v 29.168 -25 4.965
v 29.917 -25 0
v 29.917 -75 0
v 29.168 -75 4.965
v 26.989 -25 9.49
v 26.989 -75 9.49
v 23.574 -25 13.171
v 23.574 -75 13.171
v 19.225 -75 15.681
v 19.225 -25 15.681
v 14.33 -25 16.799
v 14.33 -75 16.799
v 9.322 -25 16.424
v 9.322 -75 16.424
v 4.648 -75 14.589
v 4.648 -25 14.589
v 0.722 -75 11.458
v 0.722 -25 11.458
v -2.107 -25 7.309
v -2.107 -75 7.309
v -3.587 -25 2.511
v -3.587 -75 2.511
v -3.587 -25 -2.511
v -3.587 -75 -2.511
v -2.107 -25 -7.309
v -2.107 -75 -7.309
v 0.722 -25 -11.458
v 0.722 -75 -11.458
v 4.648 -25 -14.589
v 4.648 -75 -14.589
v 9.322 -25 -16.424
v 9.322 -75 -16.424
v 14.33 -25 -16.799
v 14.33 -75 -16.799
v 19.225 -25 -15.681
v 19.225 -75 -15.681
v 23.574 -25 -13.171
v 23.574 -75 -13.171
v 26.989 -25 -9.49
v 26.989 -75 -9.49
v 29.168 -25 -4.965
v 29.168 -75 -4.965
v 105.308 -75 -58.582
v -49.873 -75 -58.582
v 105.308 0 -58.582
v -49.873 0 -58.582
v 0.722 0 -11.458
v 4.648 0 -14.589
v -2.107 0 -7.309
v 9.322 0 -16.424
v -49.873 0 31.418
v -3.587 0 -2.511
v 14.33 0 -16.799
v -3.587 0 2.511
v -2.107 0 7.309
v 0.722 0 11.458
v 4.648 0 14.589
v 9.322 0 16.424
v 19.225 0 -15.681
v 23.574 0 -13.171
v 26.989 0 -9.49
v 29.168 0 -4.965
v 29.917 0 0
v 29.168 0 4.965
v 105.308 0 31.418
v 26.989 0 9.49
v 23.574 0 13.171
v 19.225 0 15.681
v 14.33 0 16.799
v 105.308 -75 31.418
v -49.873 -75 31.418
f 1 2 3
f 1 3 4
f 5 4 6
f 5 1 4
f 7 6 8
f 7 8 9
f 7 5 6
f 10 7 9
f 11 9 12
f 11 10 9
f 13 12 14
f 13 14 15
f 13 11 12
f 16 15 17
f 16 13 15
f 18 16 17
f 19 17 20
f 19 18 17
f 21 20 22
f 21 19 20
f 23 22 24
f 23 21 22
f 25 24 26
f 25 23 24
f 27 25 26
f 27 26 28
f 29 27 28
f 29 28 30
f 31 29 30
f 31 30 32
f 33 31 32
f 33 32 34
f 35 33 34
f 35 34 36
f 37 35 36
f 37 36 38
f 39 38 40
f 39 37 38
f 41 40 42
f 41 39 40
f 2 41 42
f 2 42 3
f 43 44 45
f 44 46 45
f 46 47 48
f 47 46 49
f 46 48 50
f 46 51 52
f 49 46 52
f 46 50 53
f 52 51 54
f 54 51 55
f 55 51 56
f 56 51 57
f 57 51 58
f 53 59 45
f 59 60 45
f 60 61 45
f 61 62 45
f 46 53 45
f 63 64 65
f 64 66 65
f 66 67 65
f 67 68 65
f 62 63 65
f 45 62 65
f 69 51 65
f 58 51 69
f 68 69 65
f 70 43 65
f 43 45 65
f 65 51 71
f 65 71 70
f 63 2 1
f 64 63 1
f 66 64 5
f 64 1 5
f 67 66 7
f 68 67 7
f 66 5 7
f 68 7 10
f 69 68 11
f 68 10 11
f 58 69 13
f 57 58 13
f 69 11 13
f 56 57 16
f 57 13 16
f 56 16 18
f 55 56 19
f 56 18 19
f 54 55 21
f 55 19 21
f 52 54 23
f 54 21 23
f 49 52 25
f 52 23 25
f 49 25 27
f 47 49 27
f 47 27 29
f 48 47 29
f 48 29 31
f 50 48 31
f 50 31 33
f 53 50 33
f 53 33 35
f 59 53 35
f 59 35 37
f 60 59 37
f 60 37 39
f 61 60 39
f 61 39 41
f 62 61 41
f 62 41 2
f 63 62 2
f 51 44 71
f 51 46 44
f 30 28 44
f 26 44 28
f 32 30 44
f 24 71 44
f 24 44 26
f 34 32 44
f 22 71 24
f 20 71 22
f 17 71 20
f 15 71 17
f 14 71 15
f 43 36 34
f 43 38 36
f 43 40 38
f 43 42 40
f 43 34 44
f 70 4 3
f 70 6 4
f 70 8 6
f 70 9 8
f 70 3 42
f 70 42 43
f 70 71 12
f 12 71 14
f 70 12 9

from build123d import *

# Parameters (mm, degrees)
F0_W      = 155.180738
F0_H      = 90
F1_DEPTH  = 25
F2_R      = 16.845897
F3_DEPTH  = 25.001
F1_FACE_W = 155.180738
F1_FACE_H = 90
F1_FACE_R = 16.845897
F4_DEPTH  = 50


with BuildPart() as f1:
    # F0 (on Front) → F1 (new body)
    with BuildSketch(Plane.XZ):
        with Locations((27.717258, -13.581821)):
            Rectangle(F0_W, F0_H)
    extrude(amount=F1_DEPTH)

    # F2 (on face) → F3 (cut, through all)
    with BuildSketch(Plane.XZ.offset(25)):
        with Locations((13.070613, 0)):
            Circle(F2_R)
    extrude(amount=-F3_DEPTH, mode=Mode.SUBTRACT)

    # F1_face (on face) → F4 (join)
    with BuildSketch(Plane(origin=(27.717258, -25, -13.581821), x_dir=(1, 0, 0), z_dir=(0, -1, 0))):
        Rectangle(F1_FACE_W, F1_FACE_H)
        with Locations((-14.646645, 13.581821)):
            Circle(F1_FACE_R, mode=Mode.SUBTRACT)
    extrude(amount=F4_DEPTH)


solid = f1.part
